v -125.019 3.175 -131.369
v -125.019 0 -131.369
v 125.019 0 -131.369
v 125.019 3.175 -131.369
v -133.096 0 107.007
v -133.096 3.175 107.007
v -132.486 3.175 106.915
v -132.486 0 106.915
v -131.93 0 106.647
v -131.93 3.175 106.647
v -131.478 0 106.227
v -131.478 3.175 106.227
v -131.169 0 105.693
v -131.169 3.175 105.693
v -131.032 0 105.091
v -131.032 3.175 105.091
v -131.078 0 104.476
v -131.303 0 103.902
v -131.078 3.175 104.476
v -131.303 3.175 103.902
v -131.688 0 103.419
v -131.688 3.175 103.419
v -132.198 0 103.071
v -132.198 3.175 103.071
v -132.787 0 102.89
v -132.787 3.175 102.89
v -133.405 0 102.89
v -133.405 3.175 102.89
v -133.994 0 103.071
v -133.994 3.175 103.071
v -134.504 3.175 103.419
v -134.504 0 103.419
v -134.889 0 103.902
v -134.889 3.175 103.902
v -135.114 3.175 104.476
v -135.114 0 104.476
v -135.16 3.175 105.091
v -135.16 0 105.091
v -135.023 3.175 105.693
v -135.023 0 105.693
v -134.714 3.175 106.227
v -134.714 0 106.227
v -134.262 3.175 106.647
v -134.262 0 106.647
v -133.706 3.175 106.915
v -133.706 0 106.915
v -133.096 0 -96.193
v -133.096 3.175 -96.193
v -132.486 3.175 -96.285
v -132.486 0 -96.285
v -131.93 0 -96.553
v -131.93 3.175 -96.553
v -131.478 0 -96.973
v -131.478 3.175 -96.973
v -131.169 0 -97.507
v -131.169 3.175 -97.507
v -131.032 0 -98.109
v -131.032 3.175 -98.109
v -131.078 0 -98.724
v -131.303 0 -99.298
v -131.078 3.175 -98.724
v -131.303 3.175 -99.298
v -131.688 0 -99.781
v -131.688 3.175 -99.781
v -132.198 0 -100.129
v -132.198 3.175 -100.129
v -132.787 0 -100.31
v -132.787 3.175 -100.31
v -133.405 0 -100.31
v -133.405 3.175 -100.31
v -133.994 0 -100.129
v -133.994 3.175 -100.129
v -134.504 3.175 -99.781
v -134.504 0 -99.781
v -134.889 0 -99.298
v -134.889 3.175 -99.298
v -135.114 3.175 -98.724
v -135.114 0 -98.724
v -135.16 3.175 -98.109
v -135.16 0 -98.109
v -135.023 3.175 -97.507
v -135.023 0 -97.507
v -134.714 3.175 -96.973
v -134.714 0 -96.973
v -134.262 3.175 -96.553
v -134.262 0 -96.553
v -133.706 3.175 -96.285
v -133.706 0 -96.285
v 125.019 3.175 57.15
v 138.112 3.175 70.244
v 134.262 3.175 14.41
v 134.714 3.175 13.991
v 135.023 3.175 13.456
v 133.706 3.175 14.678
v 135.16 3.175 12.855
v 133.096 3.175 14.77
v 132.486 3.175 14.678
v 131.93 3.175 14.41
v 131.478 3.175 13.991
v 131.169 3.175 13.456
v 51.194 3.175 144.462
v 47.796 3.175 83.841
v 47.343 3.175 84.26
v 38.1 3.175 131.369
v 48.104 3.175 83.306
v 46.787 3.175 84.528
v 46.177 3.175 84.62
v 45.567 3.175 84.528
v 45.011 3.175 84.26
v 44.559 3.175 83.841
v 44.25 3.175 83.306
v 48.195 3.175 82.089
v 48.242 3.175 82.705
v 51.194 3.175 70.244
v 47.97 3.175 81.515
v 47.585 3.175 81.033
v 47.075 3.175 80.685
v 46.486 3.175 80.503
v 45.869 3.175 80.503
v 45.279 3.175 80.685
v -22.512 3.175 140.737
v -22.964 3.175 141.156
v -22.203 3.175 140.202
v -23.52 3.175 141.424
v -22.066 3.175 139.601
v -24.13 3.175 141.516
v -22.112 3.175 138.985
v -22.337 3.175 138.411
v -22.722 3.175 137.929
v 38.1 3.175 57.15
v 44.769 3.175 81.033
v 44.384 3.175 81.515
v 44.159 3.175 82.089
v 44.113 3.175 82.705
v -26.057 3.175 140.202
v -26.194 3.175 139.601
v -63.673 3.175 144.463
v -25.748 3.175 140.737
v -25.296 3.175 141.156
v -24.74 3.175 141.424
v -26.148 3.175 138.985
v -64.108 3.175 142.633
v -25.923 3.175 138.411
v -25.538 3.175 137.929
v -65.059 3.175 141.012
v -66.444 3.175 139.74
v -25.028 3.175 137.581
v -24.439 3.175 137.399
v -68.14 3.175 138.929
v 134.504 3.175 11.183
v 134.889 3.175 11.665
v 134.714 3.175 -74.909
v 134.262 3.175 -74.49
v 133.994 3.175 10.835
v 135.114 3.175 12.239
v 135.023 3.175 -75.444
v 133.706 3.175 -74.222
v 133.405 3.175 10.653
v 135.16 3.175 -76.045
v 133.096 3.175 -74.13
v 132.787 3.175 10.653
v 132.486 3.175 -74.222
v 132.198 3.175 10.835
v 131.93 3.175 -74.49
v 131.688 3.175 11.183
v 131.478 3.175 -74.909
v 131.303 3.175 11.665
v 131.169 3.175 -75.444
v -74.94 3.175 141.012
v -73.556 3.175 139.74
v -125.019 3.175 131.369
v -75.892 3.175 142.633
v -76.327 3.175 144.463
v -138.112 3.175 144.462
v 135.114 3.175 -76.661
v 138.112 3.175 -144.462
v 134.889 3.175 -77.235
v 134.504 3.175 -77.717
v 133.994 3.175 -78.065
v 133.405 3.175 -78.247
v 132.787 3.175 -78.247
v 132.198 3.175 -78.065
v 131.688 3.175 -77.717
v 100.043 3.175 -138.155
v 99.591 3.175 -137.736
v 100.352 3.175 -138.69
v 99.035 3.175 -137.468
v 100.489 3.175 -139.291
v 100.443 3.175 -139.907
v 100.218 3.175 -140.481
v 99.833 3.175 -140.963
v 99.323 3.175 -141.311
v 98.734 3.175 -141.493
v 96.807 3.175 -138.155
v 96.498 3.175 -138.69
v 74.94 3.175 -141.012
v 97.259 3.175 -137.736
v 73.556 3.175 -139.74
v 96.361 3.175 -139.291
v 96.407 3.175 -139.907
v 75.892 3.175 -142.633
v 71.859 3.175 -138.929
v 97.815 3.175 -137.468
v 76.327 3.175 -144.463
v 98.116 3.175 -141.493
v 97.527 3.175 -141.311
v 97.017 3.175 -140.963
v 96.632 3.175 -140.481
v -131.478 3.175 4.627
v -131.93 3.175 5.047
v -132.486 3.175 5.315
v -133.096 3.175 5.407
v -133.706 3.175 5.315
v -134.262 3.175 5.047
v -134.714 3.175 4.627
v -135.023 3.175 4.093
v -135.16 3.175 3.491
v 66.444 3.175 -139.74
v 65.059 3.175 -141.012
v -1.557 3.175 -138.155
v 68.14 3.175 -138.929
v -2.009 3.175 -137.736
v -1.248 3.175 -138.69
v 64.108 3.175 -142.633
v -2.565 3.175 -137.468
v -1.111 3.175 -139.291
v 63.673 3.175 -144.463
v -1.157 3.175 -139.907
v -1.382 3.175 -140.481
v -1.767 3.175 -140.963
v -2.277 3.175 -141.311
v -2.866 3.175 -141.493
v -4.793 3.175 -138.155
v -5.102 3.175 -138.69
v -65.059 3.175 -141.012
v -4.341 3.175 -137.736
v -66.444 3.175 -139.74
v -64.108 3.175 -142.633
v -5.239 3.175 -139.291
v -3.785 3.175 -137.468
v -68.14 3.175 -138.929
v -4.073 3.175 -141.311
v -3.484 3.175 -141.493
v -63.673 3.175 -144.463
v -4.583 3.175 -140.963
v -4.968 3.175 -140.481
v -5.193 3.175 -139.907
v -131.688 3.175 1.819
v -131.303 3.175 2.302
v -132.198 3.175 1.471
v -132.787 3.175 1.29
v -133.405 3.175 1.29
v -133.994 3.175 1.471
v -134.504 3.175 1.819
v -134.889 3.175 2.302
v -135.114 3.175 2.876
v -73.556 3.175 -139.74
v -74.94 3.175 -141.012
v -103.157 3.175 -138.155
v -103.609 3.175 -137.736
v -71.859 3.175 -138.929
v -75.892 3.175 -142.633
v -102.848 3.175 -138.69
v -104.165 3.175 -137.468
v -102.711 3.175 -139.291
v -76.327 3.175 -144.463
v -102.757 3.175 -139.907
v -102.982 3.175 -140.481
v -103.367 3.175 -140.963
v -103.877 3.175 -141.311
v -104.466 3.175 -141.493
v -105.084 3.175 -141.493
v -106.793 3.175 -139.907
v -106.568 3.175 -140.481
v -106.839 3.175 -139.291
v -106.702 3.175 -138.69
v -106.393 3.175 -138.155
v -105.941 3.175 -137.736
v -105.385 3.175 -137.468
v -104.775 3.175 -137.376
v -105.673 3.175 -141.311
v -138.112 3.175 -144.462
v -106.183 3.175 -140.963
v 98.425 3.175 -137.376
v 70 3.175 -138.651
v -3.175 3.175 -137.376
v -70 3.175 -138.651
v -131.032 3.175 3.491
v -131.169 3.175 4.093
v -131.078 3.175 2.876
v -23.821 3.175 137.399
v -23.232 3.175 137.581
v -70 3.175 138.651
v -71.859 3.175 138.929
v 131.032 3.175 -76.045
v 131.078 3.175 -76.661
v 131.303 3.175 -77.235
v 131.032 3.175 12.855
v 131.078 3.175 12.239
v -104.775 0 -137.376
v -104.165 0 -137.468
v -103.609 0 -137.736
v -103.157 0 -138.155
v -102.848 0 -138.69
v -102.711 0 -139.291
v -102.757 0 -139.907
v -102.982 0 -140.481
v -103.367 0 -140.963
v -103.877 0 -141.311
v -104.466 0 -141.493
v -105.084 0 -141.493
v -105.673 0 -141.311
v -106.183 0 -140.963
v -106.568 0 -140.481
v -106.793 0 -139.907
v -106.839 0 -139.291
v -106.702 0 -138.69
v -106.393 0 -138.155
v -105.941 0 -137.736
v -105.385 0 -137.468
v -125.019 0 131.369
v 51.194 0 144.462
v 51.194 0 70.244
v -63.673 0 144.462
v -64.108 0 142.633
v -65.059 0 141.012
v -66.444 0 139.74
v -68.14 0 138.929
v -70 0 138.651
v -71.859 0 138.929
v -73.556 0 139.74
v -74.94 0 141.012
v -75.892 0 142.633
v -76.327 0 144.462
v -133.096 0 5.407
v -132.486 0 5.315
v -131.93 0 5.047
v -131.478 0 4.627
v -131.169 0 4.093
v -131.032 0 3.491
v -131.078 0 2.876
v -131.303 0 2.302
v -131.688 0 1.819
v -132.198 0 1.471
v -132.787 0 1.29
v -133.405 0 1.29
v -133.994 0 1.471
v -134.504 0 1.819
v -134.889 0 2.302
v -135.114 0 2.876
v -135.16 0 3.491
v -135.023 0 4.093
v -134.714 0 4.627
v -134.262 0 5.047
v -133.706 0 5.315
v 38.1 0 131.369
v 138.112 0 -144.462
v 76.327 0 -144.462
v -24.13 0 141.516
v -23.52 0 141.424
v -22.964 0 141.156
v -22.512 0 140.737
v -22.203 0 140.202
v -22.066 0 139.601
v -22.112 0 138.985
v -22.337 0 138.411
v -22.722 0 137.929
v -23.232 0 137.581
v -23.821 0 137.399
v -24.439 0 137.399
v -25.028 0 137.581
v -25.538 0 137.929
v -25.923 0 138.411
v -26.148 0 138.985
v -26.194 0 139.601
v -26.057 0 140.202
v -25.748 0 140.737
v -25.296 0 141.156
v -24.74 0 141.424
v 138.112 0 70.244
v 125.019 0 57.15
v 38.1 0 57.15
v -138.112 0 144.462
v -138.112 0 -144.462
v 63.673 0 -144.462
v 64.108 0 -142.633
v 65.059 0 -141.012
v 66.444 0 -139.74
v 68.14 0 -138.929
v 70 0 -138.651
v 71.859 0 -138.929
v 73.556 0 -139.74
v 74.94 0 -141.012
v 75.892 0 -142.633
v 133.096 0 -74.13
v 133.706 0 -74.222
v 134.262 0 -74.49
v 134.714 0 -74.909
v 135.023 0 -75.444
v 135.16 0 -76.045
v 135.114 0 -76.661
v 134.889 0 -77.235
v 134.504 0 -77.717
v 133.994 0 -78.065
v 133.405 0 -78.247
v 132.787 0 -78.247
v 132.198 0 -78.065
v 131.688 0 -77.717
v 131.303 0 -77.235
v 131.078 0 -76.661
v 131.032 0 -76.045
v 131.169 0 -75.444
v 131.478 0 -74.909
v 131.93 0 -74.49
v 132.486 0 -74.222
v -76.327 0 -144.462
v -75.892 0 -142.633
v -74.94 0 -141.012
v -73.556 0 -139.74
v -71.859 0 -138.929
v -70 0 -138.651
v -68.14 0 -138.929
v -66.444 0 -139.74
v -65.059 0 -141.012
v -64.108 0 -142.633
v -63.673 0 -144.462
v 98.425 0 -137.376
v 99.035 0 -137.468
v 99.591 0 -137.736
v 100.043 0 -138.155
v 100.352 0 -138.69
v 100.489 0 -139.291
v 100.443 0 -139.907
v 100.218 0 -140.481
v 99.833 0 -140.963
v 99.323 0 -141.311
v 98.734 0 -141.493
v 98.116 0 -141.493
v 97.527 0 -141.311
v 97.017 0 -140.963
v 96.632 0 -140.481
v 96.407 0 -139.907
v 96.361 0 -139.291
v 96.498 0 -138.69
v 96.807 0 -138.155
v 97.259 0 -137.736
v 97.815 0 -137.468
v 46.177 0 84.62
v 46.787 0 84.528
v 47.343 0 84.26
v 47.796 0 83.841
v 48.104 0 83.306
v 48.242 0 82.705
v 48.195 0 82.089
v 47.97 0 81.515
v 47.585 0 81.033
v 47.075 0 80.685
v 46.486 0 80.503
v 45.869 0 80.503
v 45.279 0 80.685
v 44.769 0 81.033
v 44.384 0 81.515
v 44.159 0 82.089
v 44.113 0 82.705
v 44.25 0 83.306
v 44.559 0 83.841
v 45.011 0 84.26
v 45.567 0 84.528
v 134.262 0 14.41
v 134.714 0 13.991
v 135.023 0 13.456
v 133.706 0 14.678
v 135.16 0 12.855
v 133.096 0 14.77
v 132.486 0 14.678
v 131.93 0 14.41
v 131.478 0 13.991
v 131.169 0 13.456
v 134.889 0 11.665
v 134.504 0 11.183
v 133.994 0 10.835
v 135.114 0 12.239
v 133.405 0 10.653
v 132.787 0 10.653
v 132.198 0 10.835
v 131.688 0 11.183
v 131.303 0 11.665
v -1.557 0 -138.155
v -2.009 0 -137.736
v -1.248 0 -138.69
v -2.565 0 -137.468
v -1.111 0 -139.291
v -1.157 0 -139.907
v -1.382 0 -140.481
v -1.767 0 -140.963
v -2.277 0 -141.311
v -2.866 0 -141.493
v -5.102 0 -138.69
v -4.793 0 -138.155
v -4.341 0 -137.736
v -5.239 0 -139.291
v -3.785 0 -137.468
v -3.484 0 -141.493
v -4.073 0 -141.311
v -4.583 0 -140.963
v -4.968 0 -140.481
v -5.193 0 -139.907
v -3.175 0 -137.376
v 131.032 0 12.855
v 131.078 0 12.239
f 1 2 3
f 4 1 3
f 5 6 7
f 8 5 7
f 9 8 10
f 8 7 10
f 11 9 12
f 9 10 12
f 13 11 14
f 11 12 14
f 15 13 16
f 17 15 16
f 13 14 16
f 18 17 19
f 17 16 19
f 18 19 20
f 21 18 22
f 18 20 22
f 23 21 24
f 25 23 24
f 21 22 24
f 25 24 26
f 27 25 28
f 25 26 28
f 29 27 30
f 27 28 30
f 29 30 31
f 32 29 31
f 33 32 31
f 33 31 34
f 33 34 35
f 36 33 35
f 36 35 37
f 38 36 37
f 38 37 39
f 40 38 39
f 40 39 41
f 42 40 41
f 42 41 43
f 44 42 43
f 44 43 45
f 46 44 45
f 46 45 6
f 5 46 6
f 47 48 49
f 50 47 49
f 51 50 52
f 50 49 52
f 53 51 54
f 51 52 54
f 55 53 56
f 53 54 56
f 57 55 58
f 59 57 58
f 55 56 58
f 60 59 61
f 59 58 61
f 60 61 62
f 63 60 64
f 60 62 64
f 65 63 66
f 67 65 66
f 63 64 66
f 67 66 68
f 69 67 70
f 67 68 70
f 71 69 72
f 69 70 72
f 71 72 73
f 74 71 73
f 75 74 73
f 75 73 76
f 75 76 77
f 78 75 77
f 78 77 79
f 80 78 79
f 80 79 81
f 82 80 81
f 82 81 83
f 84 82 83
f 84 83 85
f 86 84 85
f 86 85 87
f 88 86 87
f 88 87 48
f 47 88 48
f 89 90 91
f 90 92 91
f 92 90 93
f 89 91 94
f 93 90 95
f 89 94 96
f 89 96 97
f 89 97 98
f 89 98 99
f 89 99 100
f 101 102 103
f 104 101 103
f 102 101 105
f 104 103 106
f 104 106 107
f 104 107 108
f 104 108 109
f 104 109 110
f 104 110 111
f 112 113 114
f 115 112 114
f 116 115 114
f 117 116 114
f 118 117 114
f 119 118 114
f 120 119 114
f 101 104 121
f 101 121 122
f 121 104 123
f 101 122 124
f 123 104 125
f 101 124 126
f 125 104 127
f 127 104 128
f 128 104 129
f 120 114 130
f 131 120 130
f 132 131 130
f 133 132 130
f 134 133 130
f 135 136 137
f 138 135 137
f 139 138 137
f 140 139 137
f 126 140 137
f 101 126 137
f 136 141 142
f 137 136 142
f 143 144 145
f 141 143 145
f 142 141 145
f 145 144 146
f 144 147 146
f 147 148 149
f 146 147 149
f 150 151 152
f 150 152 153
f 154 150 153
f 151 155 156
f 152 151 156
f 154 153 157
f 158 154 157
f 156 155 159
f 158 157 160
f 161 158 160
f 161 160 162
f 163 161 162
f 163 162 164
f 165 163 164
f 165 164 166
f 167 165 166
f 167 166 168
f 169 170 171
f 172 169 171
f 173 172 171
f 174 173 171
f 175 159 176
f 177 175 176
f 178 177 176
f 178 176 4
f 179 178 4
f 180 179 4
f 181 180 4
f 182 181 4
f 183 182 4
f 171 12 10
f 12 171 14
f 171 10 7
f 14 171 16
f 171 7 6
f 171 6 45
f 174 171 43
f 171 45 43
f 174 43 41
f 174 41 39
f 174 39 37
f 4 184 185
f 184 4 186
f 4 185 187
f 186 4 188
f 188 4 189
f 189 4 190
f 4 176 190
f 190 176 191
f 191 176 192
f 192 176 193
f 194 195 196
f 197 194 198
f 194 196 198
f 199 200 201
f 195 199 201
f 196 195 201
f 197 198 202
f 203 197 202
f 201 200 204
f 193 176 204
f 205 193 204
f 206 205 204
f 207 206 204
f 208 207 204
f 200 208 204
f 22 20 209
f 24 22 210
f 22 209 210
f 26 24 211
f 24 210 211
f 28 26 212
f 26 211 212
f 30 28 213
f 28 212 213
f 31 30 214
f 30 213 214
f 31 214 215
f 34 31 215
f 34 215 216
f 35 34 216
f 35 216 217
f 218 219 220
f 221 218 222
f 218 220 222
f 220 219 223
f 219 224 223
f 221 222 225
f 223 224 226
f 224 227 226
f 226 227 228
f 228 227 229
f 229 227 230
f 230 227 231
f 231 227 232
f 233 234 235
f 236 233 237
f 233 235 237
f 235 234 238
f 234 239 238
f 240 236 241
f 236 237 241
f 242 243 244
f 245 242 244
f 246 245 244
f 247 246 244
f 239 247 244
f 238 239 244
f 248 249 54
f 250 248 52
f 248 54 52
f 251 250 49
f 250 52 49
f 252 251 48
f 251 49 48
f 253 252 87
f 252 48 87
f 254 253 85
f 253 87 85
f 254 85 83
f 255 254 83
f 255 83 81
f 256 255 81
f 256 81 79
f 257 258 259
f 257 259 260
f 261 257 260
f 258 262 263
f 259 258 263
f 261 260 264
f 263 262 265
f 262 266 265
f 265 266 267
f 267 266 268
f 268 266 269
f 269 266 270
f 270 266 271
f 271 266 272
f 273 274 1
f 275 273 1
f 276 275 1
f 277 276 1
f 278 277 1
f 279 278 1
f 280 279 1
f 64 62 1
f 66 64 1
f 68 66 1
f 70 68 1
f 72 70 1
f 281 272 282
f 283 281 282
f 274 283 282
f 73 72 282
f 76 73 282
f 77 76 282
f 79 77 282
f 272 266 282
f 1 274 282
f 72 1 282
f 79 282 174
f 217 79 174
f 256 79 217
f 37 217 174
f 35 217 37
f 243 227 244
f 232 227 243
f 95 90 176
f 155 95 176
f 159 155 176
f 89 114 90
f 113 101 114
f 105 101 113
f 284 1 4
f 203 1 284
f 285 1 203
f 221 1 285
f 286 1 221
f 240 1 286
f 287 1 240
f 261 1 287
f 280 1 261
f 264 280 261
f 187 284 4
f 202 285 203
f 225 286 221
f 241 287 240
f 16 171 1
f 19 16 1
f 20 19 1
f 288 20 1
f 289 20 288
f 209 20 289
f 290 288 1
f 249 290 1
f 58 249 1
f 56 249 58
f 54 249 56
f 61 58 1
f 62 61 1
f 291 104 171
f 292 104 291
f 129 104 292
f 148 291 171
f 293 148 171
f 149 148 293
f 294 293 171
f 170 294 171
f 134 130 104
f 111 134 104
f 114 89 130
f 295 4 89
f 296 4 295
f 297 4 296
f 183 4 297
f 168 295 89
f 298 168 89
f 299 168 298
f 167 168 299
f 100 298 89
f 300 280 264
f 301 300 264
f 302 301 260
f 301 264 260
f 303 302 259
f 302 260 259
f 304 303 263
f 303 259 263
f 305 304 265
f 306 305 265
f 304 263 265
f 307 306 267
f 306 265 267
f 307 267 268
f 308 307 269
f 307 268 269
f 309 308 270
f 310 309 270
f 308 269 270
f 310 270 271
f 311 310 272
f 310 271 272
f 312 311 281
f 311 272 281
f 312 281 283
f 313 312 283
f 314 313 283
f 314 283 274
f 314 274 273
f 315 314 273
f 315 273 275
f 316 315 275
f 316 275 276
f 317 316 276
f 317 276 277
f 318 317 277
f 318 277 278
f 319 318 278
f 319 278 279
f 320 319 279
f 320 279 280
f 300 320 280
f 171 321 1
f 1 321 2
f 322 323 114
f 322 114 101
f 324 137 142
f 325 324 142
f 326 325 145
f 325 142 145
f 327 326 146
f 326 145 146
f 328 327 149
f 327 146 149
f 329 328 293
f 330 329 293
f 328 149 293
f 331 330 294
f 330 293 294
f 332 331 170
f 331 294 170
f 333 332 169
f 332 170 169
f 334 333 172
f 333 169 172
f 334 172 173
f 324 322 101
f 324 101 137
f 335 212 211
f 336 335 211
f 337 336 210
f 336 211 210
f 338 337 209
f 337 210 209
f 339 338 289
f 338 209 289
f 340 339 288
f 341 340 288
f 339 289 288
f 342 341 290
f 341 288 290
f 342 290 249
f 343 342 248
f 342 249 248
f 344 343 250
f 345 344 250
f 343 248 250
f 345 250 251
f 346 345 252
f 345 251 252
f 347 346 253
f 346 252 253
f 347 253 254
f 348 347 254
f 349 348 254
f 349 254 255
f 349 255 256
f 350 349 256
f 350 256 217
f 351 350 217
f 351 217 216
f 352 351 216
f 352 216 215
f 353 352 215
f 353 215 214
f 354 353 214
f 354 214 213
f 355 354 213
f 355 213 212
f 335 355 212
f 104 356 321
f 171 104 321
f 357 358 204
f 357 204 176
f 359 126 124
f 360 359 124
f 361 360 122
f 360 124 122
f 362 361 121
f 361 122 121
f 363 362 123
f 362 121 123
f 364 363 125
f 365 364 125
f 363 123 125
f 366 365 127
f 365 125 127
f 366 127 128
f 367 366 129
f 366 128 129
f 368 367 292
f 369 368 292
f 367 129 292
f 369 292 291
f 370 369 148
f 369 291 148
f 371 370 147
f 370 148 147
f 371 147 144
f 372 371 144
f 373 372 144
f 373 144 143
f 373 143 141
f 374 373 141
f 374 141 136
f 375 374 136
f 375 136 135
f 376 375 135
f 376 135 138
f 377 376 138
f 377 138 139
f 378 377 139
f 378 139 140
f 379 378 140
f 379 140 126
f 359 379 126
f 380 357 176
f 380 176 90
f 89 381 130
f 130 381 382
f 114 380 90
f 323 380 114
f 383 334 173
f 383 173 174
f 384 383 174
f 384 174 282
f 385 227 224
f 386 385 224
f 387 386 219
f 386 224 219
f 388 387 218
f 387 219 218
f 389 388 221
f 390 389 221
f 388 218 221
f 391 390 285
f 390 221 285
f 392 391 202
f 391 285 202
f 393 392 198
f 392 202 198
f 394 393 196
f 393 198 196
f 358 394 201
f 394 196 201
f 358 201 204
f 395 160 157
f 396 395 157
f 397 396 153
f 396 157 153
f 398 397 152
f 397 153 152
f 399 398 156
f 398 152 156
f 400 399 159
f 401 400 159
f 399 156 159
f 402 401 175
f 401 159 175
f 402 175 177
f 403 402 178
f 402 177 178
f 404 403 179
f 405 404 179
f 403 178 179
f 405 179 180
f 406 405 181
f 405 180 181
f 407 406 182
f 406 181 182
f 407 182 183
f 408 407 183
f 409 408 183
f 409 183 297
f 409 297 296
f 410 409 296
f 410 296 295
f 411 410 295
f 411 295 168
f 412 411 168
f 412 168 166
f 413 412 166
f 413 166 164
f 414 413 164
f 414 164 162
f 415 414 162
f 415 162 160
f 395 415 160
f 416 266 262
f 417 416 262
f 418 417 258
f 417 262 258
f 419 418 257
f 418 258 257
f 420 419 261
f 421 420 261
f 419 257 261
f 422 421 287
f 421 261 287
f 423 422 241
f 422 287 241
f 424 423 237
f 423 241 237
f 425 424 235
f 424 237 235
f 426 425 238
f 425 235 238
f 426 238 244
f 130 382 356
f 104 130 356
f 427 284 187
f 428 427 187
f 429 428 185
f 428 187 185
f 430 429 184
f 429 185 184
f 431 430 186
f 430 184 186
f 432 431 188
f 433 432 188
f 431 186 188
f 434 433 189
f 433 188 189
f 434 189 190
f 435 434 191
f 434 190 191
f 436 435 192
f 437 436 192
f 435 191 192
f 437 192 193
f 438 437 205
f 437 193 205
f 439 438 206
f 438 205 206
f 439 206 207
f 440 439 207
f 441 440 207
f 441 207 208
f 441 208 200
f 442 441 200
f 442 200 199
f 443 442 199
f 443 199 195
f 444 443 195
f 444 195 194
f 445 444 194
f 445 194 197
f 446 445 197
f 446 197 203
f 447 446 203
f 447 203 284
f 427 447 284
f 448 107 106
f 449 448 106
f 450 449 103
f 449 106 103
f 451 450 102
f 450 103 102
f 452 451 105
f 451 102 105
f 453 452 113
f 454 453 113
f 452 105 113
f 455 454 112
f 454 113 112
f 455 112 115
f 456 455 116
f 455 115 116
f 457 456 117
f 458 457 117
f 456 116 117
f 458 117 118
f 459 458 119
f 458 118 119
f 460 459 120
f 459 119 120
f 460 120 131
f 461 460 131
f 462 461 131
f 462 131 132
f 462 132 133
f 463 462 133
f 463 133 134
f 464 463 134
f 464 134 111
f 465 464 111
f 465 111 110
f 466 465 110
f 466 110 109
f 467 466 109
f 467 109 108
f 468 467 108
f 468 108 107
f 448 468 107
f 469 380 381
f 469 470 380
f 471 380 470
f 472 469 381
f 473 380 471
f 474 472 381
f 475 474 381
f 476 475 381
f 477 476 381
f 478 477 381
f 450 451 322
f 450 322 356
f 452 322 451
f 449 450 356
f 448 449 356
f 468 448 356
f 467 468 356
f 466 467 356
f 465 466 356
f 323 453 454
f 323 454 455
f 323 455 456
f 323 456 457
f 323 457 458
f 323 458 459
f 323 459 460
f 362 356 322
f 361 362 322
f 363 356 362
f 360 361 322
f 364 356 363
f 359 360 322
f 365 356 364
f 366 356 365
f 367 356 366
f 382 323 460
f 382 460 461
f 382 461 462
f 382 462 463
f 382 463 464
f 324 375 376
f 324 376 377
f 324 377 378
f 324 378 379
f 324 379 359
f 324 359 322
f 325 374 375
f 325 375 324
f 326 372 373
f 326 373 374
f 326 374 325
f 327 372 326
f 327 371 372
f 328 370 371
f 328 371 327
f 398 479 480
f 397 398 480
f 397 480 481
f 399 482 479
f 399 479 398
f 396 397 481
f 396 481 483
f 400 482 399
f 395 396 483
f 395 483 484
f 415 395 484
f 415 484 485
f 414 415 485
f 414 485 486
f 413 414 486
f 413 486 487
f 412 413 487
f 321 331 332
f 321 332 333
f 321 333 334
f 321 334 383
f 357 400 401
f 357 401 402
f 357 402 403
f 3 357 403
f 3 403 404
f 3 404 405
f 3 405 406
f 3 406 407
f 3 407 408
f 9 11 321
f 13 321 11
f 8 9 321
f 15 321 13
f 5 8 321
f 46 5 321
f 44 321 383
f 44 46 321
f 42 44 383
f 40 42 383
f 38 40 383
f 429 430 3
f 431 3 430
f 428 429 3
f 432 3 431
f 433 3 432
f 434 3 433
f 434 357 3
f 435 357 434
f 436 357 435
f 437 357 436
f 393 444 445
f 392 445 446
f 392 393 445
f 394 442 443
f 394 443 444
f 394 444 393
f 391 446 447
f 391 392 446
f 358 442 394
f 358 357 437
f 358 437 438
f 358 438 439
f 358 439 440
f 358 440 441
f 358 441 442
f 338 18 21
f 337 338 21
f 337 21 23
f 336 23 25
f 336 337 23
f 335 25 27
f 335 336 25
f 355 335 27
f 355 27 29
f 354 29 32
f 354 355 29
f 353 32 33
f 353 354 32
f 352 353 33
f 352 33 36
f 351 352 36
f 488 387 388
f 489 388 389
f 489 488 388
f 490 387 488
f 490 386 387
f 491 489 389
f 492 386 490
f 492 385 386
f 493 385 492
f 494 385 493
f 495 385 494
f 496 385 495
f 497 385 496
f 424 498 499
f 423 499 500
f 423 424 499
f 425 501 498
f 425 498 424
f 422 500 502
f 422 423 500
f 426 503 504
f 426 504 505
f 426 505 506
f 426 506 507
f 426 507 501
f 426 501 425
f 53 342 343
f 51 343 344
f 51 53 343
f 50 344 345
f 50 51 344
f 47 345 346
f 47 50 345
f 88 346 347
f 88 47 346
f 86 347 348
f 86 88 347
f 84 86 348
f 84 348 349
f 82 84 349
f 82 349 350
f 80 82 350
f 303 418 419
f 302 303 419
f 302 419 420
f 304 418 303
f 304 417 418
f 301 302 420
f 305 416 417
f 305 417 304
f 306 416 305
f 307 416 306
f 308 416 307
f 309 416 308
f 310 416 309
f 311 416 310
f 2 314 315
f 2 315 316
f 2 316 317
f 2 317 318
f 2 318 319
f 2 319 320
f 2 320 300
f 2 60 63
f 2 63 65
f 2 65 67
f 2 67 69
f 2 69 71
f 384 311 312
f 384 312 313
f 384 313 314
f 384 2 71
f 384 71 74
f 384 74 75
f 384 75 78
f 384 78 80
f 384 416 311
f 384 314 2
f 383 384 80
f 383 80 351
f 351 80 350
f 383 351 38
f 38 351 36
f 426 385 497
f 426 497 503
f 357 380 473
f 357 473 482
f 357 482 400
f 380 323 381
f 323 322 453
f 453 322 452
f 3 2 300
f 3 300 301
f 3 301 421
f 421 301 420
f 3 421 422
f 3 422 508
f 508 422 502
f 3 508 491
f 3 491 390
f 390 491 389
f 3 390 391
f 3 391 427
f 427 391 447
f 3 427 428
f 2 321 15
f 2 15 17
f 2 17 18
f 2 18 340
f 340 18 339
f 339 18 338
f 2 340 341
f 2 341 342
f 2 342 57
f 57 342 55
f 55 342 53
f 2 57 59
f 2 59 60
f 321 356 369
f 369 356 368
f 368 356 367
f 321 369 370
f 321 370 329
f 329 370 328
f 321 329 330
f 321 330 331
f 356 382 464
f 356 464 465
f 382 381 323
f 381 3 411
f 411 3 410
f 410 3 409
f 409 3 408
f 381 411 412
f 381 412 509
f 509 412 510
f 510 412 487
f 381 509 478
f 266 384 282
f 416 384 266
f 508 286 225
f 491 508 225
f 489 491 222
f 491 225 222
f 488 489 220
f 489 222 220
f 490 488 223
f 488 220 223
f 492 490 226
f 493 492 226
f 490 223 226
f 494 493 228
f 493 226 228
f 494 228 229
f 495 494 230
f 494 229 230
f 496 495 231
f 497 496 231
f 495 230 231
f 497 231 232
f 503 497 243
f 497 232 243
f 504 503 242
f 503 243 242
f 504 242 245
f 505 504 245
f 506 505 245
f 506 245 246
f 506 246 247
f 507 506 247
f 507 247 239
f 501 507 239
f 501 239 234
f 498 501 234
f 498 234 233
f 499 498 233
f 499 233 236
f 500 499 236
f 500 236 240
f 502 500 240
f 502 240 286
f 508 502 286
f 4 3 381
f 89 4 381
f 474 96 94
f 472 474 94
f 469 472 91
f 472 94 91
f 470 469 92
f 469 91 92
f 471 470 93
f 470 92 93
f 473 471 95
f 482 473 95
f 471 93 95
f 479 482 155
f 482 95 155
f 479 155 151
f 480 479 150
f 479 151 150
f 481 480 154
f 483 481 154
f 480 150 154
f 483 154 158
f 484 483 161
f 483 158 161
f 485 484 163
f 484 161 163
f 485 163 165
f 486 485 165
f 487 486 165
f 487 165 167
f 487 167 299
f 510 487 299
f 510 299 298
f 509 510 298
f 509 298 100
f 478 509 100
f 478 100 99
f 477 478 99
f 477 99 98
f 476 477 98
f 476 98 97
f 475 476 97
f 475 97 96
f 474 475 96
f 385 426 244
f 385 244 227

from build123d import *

# Parameters (mm, degrees)
EXTRUDE1_DEPTH = 3.175
SKETCH2_R      = 2.0701
EXTRUDE2_DEPTH = 200.886360684
SKETCH3_R      = 6.35
EXTRUDE3_DEPTH = 200.886360684


with BuildPart() as part:
    # Sketch1 → Extrude1 (new body)
    with BuildSketch(Plane(origin=(0, 0, 0), x_dir=(1, 0, 0), z_dir=(0, 1, 0))):
        Polygon((-138.1125, 144.4625), (138.1125, 144.4625), (138.1125, -70.2437), (51.1937, -70.2437), (51.1937, -144.4625), (-138.1125, -144.4625), align=None)
        Polygon((-125.0188, 131.3688), (125.0188, 131.3688), (125.0188, -57.15), (38.1, -57.15), (38.1, -131.3688), (-125.0188, -131.3688), align=None, mode=Mode.SUBTRACT)
    extrude(amount=EXTRUDE1_DEPTH)

    # Sketch2 → Extrude2 (cut, through all)
    with BuildSketch(Plane(origin=(0, 3.175, 0), x_dir=(-1, 0, 0), z_dir=(0, 1, 0))):
        with Locations(Location((24.13, 139.446, 0), (0, 0, 90))):
            Circle(SKETCH2_R)
        with Locations(Location((104.775, -139.446, 0), (0, 0, 90))):
            Circle(SKETCH2_R)
        with Locations(Location((3.175, -139.446, 0), (0, 0, 90))):
            Circle(SKETCH2_R)
        with Locations(Location((133.096, 104.9365694, 0), (0, 0, 90))):
            Circle(SKETCH2_R)
        with Locations(Location((133.096, 3.3365694, 0), (0, 0, 90))):
            Circle(SKETCH2_R)
        with Locations(Location((133.096, -98.2634306, 0), (0, 0, 90))):
            Circle(SKETCH2_R)
        with Locations(Location((-98.425, -139.446, 0), (0, 0, 90))):
            Circle(SKETCH2_R)
        with Locations(Location((-133.096, -76.2, 0), (0, 0, 90))):
            Circle(SKETCH2_R)
        with Locations(Location((-133.096, 12.7, 0), (0, 0, 90))):
            Circle(SKETCH2_R)
        with Locations(Location((-46.1772, 82.55, 0), (0, 0, 90))):
            Circle(SKETCH2_R)
    extrude(amount=-EXTRUDE2_DEPTH, mode=Mode.SUBTRACT)

    # Sketch3 → Extrude3 (cut, through all)
    with BuildSketch(Plane(origin=(0, 3.175, 0), x_dir=(-1, 0, 0), z_dir=(0, 1, 0))):
        with Locations((69.99986, 145.00098)):
            Circle(SKETCH3_R)
        with Locations((69.99986, -145.00098)):
            Circle(SKETCH3_R)
        with Locations((-69.99986, -145.00098)):
            Circle(SKETCH3_R)
    extrude(amount=-EXTRUDE3_DEPTH, mode=Mode.SUBTRACT)


solid = part.part
